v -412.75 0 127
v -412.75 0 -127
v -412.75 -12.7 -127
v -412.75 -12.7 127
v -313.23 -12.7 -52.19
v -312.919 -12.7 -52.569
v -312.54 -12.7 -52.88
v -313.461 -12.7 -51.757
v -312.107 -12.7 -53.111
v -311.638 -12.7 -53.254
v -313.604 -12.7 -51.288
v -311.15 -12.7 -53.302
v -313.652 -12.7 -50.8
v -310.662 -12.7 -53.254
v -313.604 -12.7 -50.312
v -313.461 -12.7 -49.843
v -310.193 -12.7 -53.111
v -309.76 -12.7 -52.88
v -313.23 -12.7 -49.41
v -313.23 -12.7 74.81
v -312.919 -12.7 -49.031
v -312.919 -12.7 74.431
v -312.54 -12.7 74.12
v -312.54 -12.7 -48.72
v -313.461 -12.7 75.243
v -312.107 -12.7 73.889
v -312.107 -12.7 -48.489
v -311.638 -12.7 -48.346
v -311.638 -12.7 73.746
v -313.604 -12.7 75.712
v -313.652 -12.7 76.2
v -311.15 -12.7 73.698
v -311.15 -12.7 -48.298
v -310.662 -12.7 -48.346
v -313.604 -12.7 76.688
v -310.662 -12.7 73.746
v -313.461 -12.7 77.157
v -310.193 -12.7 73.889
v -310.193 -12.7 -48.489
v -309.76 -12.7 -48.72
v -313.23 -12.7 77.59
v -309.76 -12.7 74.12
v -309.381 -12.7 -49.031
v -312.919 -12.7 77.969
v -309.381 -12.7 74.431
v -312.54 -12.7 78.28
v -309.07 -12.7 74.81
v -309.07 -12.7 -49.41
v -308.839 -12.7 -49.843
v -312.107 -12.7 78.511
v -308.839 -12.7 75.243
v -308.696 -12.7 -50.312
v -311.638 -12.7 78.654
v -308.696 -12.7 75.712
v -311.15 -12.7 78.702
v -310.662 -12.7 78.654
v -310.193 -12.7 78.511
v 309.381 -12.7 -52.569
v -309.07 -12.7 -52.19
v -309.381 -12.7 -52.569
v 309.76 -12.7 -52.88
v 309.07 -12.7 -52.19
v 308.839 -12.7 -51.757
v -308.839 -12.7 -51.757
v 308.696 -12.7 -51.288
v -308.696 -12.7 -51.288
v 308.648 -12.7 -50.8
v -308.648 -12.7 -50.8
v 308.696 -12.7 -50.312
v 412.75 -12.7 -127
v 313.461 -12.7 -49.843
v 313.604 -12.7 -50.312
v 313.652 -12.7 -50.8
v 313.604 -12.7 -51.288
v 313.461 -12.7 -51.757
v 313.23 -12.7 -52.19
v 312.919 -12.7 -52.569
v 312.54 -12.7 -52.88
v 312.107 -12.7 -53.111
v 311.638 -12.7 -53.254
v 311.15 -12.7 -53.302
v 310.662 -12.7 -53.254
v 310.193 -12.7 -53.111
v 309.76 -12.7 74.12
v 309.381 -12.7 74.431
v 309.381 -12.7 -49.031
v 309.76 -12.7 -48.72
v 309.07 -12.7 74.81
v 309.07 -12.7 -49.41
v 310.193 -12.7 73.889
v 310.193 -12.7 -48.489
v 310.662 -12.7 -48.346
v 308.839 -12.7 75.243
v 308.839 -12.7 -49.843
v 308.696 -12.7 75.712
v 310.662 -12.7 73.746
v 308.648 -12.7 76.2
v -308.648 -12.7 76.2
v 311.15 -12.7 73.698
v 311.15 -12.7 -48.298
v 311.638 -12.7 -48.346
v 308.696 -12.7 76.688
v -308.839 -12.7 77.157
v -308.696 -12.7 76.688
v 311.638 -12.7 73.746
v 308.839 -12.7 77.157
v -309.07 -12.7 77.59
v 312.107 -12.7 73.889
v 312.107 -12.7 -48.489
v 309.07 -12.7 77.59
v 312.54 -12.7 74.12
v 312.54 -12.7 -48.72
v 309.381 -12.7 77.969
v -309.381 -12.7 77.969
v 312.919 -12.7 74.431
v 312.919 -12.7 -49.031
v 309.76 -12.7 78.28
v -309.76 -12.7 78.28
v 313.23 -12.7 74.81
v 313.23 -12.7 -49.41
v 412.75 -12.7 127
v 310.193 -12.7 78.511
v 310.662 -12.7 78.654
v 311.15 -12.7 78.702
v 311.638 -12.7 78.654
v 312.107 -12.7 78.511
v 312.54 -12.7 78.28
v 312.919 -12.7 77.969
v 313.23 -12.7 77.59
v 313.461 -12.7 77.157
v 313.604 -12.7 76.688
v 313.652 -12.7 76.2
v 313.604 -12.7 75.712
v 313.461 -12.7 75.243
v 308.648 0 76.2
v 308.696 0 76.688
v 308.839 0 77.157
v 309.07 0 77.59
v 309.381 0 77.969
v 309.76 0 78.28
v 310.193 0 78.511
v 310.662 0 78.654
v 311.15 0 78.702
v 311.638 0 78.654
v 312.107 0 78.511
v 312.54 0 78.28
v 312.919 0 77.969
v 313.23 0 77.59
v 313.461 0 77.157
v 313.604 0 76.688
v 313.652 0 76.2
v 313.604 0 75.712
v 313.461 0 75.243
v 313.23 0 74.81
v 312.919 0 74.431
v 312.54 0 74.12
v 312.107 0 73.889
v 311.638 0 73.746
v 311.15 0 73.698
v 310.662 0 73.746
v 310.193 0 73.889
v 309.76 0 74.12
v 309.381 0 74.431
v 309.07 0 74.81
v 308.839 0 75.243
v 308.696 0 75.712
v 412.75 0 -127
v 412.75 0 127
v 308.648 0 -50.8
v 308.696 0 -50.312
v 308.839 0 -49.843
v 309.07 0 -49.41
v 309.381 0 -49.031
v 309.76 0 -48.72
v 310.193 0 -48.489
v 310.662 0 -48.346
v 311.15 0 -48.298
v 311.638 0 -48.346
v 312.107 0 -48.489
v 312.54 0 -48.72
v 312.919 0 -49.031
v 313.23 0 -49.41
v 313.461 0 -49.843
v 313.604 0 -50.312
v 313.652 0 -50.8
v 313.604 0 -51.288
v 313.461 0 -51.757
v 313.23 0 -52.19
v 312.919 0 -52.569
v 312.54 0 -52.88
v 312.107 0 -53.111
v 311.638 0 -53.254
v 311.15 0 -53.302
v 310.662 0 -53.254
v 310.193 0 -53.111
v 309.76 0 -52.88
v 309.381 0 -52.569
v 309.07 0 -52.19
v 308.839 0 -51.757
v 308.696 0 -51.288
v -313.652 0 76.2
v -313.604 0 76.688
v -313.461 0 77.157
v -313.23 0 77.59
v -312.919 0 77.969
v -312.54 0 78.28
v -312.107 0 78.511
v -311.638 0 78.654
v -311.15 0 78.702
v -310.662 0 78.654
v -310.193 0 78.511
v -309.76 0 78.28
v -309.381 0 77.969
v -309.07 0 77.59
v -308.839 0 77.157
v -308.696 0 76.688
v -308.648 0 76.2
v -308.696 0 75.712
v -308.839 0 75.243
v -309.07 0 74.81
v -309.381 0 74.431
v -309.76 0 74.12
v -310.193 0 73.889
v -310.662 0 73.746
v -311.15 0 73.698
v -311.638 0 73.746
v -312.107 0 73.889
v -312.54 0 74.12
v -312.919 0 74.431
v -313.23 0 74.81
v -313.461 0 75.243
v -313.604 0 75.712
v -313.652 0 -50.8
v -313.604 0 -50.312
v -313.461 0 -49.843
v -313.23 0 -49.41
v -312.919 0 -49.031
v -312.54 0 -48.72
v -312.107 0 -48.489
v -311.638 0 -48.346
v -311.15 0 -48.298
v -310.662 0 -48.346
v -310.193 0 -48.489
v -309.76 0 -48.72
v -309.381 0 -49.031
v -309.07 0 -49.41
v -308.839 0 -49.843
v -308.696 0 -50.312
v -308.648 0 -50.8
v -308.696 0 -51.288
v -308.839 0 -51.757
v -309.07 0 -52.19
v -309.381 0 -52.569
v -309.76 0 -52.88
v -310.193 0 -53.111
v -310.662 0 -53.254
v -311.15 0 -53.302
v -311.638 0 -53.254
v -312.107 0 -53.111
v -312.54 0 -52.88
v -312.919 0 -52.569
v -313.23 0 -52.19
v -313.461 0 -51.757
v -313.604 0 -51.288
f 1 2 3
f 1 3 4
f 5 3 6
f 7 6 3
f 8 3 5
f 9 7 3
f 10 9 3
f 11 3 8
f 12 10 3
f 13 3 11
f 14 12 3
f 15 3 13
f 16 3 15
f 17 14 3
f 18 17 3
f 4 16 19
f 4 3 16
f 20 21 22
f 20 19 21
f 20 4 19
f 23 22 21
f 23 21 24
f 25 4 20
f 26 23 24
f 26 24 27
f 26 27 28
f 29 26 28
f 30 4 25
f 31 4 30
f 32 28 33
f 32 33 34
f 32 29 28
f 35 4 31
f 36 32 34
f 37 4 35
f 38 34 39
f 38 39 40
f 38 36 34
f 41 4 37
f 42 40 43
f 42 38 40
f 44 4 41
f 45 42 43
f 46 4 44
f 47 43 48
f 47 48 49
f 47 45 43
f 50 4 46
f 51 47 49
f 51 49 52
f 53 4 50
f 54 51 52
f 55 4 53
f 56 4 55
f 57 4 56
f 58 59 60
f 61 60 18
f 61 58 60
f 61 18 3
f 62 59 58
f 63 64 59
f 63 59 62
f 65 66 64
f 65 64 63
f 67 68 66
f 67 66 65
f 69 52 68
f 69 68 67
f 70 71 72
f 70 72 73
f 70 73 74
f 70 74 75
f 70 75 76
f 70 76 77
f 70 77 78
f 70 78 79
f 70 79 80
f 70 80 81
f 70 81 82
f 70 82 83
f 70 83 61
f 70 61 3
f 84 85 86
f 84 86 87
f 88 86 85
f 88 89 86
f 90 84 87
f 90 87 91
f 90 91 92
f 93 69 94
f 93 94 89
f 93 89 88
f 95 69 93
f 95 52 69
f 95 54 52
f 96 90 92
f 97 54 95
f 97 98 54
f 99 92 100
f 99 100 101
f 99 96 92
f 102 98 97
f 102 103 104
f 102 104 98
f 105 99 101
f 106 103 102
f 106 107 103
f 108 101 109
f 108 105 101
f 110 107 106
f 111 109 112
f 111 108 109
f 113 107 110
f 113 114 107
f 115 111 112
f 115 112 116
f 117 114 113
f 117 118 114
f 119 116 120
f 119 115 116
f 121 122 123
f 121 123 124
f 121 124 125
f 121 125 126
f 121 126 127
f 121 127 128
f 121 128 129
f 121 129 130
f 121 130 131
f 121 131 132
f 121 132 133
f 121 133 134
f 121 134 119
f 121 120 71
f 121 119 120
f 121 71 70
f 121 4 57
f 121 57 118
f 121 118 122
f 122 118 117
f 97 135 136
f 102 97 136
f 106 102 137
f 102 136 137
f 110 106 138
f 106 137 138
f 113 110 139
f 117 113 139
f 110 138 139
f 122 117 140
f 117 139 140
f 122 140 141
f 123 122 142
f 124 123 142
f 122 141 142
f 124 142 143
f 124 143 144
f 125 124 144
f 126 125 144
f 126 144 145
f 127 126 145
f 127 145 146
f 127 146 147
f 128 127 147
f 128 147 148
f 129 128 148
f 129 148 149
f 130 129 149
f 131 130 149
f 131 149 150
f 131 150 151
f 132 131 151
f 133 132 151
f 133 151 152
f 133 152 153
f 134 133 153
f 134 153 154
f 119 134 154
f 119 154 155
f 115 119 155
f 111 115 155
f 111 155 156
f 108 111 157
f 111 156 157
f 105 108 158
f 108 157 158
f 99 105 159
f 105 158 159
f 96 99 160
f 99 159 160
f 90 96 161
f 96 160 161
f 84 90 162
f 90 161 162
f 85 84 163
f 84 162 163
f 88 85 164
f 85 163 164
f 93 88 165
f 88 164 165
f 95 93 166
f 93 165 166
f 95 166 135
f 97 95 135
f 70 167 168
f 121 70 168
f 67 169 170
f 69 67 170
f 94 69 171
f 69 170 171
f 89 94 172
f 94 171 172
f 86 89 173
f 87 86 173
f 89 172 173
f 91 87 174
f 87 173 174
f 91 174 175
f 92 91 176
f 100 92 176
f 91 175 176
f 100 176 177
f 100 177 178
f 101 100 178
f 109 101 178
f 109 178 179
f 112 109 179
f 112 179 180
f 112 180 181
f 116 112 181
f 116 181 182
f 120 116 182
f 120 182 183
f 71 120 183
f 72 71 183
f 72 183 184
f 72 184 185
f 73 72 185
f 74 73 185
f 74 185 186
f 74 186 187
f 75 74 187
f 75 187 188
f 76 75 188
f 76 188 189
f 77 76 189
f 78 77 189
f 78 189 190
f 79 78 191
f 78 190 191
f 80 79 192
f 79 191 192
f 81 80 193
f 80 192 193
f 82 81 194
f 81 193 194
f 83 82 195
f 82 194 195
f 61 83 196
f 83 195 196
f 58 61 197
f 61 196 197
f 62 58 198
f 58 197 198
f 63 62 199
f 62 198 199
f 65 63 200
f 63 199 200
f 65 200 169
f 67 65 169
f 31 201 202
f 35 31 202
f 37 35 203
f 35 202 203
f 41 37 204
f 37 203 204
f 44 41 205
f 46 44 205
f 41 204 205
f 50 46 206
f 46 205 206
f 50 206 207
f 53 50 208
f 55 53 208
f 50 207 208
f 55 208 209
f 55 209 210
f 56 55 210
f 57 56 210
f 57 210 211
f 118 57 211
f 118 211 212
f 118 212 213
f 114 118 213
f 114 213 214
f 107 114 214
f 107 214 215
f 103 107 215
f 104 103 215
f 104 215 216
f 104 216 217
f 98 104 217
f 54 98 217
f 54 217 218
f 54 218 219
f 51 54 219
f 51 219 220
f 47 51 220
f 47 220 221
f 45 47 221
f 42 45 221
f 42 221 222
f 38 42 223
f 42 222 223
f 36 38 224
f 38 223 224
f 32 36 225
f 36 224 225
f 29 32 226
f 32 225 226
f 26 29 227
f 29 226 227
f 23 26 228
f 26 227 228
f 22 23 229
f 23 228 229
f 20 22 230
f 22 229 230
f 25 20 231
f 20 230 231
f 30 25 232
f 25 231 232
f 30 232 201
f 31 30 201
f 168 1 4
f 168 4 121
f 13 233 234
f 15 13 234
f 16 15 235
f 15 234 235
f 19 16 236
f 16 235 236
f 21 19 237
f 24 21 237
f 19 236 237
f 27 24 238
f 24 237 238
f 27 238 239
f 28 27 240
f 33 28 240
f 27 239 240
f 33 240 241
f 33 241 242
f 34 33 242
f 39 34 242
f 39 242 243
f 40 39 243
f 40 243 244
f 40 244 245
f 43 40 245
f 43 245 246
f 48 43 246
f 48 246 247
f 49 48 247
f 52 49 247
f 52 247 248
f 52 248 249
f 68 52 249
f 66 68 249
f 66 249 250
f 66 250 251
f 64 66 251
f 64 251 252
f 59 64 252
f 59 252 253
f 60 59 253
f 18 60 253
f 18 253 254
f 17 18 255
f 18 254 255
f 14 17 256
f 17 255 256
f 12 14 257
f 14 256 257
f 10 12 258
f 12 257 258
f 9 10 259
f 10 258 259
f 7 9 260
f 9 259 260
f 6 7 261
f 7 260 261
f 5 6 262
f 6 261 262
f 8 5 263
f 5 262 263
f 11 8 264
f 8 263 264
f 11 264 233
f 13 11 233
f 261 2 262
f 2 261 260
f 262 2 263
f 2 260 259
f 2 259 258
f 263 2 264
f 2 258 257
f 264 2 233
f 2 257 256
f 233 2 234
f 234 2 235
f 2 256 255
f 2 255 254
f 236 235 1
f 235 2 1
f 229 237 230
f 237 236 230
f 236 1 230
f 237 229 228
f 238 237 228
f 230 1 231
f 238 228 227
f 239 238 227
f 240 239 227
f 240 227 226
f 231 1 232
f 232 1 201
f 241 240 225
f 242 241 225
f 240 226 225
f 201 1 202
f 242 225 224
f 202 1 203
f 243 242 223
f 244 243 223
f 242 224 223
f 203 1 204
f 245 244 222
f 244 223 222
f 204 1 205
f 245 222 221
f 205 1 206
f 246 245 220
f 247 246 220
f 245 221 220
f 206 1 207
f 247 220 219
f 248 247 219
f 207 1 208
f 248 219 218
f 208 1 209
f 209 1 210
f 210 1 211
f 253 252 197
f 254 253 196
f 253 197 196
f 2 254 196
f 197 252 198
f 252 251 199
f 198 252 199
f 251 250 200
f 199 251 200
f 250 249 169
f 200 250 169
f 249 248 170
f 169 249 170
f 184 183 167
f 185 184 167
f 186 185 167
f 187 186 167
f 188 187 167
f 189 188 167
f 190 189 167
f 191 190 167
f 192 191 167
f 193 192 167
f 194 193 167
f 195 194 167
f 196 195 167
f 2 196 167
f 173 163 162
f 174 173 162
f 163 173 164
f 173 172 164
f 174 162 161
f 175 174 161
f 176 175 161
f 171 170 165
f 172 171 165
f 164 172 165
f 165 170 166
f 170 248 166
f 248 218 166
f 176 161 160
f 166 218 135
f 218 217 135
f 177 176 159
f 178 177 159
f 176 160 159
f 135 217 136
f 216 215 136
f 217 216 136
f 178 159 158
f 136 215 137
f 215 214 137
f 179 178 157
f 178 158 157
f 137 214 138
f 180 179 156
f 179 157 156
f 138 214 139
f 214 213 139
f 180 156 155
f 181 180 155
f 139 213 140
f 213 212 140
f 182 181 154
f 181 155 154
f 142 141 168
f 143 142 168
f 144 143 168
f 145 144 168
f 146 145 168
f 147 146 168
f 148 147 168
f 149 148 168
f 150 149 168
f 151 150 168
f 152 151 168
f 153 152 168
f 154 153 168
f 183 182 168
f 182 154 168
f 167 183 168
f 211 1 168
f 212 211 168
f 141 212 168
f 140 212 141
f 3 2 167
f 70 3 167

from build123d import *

# Parameters (mm, degrees)
F0_W     = 825.5
F0_H     = 254
F1_DEPTH = 12.7
F3_D     = 5.0038
F3_DEPTH = 14.224


with BuildPart() as f1:
    # F0 (on Front) → F1 (new body)
    with BuildSketch(Plane.XZ):
        Rectangle(F0_W, F0_H)
    extrude(amount=F1_DEPTH)

    # F3
    with Locations(Plane.XZ.offset(12.7)):
        with Locations((-311.15, 76.2), (-311.15, -50.8), (311.15, 76.2), (311.15, -50.8)):
            Hole(F3_D / 2, depth=F3_DEPTH)


solid = f1.part
